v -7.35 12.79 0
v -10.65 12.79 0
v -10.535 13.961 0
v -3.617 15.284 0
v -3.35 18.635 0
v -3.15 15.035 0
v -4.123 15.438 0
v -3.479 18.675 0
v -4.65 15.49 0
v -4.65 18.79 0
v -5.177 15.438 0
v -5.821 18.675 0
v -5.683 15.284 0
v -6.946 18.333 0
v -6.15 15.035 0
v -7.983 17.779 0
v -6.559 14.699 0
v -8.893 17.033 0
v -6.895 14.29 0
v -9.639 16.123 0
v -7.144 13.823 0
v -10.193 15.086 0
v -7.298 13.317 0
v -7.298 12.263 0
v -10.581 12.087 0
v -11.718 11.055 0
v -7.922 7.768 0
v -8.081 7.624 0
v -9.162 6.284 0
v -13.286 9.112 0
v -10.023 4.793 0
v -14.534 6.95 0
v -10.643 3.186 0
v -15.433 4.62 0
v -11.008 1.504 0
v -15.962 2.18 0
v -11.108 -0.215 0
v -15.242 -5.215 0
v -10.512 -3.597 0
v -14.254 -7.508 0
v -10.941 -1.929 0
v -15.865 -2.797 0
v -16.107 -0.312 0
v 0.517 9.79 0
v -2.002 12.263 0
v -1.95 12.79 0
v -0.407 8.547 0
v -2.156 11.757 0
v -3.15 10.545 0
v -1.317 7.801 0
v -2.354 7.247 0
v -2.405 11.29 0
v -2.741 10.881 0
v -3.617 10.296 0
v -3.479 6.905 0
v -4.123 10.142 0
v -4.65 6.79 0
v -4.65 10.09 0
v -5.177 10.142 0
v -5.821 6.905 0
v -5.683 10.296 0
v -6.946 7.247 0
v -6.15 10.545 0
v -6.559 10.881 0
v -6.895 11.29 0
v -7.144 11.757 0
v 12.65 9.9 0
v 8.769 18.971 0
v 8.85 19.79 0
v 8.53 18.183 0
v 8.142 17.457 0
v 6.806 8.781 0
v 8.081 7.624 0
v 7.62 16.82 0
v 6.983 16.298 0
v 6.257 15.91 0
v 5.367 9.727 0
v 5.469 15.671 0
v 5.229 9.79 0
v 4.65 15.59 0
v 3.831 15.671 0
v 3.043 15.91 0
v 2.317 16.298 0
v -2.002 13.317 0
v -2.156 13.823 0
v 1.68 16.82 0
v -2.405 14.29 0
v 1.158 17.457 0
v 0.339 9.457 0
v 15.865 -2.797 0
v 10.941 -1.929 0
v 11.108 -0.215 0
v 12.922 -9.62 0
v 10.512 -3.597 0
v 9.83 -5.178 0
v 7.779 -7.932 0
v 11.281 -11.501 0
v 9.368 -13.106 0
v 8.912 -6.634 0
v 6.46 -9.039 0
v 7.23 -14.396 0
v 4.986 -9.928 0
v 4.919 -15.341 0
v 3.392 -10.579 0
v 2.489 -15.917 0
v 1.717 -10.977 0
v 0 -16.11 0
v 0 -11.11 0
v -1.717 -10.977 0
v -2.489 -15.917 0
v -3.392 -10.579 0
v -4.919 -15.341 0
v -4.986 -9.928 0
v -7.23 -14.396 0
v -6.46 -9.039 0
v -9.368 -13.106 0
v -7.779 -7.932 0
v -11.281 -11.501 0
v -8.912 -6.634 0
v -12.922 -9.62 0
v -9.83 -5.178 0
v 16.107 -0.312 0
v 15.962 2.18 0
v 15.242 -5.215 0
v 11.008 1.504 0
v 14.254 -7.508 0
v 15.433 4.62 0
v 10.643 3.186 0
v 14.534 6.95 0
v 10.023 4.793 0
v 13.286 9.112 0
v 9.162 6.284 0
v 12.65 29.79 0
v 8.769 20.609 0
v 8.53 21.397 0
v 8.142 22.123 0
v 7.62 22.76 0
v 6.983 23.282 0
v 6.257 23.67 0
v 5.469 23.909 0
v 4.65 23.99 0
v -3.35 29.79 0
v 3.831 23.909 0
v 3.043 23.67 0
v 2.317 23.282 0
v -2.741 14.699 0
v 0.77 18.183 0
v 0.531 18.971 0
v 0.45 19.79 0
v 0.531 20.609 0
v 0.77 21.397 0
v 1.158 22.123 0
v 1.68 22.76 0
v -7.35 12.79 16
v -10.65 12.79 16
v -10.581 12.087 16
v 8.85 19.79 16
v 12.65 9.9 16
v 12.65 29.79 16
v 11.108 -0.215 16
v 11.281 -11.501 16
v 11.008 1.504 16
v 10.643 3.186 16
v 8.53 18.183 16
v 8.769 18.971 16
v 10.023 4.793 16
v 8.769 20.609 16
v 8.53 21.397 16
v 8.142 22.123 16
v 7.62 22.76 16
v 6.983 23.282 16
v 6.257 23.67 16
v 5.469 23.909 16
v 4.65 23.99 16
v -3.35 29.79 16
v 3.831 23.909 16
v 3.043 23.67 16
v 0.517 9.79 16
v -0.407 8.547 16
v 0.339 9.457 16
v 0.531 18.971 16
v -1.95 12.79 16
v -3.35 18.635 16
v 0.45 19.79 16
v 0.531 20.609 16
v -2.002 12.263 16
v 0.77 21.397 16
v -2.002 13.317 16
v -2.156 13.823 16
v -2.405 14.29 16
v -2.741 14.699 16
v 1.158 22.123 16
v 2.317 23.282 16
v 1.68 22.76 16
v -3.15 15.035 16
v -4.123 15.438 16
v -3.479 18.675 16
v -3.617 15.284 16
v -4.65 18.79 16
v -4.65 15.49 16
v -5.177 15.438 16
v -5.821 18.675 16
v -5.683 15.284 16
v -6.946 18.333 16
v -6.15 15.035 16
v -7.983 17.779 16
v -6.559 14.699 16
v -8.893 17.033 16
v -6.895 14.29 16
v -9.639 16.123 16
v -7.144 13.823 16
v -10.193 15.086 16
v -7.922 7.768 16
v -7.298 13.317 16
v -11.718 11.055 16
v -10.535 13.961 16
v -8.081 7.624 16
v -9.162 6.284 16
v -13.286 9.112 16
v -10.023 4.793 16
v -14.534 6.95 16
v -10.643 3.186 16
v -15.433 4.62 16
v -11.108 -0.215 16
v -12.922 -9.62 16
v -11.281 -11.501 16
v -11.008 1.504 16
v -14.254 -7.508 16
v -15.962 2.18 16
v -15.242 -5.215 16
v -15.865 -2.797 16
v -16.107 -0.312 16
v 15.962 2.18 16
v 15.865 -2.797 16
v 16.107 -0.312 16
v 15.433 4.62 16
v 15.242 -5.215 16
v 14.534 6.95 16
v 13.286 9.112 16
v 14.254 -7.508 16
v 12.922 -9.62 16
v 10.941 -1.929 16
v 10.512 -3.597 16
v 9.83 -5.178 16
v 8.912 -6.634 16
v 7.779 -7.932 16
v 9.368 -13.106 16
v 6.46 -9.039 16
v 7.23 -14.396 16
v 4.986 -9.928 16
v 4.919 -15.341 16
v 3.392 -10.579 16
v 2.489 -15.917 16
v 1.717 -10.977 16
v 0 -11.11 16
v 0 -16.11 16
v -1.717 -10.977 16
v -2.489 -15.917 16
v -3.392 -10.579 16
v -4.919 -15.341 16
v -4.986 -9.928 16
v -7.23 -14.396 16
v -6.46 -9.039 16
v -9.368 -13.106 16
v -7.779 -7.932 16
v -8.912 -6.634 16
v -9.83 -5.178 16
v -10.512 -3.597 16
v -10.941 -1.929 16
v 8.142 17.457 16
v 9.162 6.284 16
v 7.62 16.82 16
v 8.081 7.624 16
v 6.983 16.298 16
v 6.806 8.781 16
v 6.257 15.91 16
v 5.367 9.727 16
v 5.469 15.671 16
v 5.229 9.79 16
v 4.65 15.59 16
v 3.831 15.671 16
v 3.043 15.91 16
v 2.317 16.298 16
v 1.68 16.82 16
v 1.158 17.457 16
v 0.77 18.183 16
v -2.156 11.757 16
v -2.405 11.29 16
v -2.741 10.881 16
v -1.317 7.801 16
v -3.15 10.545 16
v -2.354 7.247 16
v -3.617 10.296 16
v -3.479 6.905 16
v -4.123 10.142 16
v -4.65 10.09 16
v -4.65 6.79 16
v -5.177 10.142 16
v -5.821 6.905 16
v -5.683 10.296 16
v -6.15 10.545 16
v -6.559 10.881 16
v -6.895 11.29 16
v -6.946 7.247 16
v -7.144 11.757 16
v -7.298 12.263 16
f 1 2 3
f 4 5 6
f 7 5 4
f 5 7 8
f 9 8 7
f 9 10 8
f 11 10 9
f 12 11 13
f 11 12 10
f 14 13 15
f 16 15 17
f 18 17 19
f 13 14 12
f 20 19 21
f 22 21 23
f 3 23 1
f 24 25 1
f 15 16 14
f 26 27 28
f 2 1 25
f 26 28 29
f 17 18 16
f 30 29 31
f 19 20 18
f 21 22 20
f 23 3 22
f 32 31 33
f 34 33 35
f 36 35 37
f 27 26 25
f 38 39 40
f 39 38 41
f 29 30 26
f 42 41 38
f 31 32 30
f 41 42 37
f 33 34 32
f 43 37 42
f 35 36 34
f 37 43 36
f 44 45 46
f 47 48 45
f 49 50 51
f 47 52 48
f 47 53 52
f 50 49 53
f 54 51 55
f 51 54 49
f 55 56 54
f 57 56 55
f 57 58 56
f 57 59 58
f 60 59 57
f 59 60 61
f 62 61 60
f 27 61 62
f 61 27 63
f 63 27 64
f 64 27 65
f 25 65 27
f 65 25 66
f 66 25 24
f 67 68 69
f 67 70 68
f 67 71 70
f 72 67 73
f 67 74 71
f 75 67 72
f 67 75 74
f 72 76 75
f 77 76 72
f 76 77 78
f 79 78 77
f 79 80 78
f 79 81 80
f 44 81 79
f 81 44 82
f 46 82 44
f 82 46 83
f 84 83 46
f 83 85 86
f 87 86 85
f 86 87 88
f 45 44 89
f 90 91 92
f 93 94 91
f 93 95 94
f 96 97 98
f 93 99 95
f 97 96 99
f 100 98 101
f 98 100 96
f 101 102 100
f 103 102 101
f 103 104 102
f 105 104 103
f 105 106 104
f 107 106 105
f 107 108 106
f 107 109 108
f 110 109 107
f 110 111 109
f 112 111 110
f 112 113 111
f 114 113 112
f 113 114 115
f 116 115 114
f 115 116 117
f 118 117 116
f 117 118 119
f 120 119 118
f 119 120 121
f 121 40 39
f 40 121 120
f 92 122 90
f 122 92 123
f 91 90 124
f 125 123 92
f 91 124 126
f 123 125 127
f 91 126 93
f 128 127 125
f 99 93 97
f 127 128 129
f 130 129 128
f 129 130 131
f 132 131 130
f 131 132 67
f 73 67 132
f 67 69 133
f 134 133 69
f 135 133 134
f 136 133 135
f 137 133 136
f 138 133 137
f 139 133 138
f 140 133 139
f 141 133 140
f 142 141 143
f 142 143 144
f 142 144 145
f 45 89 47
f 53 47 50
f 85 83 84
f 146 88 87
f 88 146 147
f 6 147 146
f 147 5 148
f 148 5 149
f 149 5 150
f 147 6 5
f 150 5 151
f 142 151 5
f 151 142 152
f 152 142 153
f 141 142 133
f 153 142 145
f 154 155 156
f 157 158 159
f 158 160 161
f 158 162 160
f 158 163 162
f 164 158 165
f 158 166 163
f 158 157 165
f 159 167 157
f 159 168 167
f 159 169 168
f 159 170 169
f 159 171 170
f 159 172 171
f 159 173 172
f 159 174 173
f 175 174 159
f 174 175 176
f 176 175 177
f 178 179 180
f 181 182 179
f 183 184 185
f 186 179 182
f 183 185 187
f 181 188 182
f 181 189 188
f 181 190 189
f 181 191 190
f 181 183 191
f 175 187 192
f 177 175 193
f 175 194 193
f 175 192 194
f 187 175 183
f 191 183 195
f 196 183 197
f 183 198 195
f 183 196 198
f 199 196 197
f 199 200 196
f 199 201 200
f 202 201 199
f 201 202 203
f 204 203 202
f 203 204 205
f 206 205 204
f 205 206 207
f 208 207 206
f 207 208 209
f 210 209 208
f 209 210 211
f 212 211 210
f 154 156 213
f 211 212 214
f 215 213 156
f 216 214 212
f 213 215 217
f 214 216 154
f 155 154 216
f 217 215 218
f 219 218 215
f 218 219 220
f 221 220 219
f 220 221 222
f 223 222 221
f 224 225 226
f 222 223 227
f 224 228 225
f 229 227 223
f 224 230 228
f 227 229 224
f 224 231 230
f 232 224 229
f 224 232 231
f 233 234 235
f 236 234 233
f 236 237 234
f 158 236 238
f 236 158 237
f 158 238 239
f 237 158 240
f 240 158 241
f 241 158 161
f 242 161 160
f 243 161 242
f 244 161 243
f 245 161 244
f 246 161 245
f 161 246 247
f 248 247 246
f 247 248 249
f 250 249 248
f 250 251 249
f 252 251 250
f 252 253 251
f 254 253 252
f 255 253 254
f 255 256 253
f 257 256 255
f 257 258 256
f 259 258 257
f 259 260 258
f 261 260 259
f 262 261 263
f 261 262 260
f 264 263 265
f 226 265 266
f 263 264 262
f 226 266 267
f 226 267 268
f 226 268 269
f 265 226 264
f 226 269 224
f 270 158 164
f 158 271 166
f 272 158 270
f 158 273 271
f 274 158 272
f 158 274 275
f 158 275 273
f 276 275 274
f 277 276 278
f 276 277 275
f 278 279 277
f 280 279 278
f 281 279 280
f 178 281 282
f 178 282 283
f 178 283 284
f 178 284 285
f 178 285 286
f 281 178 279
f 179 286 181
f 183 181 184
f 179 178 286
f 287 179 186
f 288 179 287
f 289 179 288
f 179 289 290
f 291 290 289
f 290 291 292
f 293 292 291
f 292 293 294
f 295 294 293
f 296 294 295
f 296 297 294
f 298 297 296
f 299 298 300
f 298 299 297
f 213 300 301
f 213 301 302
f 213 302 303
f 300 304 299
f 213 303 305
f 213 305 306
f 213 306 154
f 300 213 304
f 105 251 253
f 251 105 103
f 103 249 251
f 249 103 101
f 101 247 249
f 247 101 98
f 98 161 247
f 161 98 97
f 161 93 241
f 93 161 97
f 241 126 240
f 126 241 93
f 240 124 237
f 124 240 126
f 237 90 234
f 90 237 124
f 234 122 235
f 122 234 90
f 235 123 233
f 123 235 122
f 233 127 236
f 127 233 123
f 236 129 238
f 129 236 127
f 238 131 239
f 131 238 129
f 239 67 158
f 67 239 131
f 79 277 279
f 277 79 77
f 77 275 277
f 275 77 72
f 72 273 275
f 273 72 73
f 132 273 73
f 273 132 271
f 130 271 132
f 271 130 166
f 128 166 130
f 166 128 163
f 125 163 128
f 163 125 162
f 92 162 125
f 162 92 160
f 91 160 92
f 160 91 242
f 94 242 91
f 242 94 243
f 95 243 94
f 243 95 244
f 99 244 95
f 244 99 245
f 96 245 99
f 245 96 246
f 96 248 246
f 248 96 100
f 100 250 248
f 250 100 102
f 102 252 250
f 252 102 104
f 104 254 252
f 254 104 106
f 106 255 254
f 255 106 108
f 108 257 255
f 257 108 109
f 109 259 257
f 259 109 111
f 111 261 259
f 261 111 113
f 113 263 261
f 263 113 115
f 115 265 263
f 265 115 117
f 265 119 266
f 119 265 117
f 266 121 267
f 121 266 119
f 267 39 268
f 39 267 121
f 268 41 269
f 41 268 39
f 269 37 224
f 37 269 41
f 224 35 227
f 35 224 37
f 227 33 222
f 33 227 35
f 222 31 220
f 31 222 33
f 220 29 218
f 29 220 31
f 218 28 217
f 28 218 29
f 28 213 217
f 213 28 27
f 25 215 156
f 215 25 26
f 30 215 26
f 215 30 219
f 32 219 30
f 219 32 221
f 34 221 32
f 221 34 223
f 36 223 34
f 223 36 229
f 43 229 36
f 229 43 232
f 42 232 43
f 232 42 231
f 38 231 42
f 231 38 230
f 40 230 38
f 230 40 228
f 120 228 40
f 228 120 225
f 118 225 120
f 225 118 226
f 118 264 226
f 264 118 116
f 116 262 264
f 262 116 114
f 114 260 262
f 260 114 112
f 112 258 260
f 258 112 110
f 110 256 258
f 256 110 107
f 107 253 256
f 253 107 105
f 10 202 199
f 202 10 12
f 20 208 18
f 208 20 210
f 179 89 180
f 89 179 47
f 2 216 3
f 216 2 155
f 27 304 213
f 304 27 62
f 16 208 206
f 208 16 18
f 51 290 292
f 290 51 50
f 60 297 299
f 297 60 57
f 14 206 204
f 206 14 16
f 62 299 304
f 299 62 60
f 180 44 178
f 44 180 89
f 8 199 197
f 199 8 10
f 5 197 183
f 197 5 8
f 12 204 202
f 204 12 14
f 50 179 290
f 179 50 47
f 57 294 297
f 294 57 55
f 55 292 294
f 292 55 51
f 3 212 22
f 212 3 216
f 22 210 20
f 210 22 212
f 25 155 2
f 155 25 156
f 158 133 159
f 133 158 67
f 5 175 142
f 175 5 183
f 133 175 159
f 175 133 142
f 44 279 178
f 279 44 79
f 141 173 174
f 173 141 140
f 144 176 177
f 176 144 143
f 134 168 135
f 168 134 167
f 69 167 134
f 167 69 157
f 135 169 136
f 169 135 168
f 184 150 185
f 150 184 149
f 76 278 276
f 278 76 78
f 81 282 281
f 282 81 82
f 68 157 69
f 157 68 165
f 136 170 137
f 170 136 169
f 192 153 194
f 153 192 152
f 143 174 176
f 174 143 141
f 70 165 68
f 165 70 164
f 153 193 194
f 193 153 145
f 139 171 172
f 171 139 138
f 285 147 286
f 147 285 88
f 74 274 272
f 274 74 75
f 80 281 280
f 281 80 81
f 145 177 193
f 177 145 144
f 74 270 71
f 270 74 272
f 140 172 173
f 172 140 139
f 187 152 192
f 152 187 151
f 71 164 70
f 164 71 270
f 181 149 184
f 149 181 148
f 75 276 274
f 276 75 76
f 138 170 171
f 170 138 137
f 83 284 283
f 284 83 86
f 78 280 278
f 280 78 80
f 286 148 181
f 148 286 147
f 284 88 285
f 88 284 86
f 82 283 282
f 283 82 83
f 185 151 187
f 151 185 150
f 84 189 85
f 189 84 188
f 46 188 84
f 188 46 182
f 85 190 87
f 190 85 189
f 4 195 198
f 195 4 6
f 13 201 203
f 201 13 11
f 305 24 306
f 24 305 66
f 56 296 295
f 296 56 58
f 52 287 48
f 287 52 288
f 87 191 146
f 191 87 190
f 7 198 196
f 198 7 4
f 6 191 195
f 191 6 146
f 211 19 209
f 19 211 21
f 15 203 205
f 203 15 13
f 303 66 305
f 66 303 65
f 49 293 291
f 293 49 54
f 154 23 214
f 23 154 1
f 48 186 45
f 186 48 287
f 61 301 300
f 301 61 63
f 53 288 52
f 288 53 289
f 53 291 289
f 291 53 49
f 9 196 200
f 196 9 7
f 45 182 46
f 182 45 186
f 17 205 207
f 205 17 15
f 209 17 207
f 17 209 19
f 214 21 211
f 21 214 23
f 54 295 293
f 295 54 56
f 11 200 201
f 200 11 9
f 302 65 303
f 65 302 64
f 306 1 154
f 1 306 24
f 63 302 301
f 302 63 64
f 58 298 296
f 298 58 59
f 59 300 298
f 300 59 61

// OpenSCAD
$fn = 32;

// ----------------------------------------------------------------------
// Pipe clamp: 32.22 mm ring, 5 mm wall, 16 mm wide
// ----------------------------------------------------------------------

// --- parameters (mm) ---
outer_r = 16.11;          // clamp outside radius
inner_r = 11.11;          // pipe bore radius
band = 5;                 // band thickness
clamp_w = 16;             // clamp width
opening = 40;             // opening angle between the ends
lug_w = 16;               // lug width
lug_len = 20;             // lug length
bolt_d = 8.4;             // bolt hole
knuckle_d = 12;           // hinge knuckle diameter
pin_d = 5.4;              // hinge pin hole

clamp_profile = [[-5.51, 15.138], [-7.783, 14.105], [-9.869, 12.733], [-11.718, 11.055], [-13.286, 9.112], [-14.534, 6.95], [-15.433, 4.62], [-15.962, 2.18], [-16.107, -0.312], [-15.865, -2.797], [-15.242, -5.215], [-14.254, -7.508], [-12.922, -9.62], [-11.281, -11.501], [-9.368, -13.106], [-7.23, -14.396], [-4.919, -15.341], [-2.489, -15.917], [0, -16.11], [2.489, -15.917], [4.919, -15.341], [7.23, -14.396], [9.368, -13.106], [11.281, -11.501], [12.922, -9.62], [14.254, -7.508], [15.242, -5.215], [15.865, -2.797], [16.107, -0.312], [15.962, 2.18], [15.433, 4.62], [14.534, 6.95], [13.286, 9.112], [11.718, 11.055], [9.869, 12.733], [7.783, 14.105], [5.51, 15.138], [3.8, 10.44], [5.367, 9.727], [6.806, 8.781], [8.081, 7.624], [9.162, 6.284], [10.023, 4.793], [10.643, 3.186], [11.008, 1.504], [11.108, -0.215], [10.941, -1.929], [10.512, -3.597], [9.83, -5.178], [8.912, -6.634], [7.779, -7.932], [6.46, -9.039], [4.986, -9.928], [3.392, -10.579], [1.717, -10.977], [0, -11.11], [-1.717, -10.977], [-3.392, -10.579], [-4.986, -9.928], [-6.46, -9.039], [-7.779, -7.932], [-8.912, -6.634], [-9.83, -5.178], [-10.512, -3.597], [-10.941, -1.929], [-11.108, -0.215], [-11.008, 1.504], [-10.643, 3.186], [-10.023, 4.793], [-9.162, 6.284], [-8.081, 7.624], [-6.806, 8.781], [-5.367, 9.727], [-3.8, 10.44]];

difference() {
  union() {
    linear_extrude(height = clamp_w) polygon(clamp_profile);
    /* hinge knuckle, sunk 2 mm into the band end */
    translate([-4.65, 12.79, 0]) cylinder(h = clamp_w, d = knuckle_d);
    /* bolt lug on the other end */
    translate([-3.35, 9.79, 0]) cube([lug_w, 20, clamp_w]);
  }
  translate([4.65, 19.79, -2.5]) cylinder(h = clamp_w + 5, d = bolt_d);
  translate([-4.65, 12.79, -2.5]) cylinder(h = clamp_w + 5, d = pin_d);
}
